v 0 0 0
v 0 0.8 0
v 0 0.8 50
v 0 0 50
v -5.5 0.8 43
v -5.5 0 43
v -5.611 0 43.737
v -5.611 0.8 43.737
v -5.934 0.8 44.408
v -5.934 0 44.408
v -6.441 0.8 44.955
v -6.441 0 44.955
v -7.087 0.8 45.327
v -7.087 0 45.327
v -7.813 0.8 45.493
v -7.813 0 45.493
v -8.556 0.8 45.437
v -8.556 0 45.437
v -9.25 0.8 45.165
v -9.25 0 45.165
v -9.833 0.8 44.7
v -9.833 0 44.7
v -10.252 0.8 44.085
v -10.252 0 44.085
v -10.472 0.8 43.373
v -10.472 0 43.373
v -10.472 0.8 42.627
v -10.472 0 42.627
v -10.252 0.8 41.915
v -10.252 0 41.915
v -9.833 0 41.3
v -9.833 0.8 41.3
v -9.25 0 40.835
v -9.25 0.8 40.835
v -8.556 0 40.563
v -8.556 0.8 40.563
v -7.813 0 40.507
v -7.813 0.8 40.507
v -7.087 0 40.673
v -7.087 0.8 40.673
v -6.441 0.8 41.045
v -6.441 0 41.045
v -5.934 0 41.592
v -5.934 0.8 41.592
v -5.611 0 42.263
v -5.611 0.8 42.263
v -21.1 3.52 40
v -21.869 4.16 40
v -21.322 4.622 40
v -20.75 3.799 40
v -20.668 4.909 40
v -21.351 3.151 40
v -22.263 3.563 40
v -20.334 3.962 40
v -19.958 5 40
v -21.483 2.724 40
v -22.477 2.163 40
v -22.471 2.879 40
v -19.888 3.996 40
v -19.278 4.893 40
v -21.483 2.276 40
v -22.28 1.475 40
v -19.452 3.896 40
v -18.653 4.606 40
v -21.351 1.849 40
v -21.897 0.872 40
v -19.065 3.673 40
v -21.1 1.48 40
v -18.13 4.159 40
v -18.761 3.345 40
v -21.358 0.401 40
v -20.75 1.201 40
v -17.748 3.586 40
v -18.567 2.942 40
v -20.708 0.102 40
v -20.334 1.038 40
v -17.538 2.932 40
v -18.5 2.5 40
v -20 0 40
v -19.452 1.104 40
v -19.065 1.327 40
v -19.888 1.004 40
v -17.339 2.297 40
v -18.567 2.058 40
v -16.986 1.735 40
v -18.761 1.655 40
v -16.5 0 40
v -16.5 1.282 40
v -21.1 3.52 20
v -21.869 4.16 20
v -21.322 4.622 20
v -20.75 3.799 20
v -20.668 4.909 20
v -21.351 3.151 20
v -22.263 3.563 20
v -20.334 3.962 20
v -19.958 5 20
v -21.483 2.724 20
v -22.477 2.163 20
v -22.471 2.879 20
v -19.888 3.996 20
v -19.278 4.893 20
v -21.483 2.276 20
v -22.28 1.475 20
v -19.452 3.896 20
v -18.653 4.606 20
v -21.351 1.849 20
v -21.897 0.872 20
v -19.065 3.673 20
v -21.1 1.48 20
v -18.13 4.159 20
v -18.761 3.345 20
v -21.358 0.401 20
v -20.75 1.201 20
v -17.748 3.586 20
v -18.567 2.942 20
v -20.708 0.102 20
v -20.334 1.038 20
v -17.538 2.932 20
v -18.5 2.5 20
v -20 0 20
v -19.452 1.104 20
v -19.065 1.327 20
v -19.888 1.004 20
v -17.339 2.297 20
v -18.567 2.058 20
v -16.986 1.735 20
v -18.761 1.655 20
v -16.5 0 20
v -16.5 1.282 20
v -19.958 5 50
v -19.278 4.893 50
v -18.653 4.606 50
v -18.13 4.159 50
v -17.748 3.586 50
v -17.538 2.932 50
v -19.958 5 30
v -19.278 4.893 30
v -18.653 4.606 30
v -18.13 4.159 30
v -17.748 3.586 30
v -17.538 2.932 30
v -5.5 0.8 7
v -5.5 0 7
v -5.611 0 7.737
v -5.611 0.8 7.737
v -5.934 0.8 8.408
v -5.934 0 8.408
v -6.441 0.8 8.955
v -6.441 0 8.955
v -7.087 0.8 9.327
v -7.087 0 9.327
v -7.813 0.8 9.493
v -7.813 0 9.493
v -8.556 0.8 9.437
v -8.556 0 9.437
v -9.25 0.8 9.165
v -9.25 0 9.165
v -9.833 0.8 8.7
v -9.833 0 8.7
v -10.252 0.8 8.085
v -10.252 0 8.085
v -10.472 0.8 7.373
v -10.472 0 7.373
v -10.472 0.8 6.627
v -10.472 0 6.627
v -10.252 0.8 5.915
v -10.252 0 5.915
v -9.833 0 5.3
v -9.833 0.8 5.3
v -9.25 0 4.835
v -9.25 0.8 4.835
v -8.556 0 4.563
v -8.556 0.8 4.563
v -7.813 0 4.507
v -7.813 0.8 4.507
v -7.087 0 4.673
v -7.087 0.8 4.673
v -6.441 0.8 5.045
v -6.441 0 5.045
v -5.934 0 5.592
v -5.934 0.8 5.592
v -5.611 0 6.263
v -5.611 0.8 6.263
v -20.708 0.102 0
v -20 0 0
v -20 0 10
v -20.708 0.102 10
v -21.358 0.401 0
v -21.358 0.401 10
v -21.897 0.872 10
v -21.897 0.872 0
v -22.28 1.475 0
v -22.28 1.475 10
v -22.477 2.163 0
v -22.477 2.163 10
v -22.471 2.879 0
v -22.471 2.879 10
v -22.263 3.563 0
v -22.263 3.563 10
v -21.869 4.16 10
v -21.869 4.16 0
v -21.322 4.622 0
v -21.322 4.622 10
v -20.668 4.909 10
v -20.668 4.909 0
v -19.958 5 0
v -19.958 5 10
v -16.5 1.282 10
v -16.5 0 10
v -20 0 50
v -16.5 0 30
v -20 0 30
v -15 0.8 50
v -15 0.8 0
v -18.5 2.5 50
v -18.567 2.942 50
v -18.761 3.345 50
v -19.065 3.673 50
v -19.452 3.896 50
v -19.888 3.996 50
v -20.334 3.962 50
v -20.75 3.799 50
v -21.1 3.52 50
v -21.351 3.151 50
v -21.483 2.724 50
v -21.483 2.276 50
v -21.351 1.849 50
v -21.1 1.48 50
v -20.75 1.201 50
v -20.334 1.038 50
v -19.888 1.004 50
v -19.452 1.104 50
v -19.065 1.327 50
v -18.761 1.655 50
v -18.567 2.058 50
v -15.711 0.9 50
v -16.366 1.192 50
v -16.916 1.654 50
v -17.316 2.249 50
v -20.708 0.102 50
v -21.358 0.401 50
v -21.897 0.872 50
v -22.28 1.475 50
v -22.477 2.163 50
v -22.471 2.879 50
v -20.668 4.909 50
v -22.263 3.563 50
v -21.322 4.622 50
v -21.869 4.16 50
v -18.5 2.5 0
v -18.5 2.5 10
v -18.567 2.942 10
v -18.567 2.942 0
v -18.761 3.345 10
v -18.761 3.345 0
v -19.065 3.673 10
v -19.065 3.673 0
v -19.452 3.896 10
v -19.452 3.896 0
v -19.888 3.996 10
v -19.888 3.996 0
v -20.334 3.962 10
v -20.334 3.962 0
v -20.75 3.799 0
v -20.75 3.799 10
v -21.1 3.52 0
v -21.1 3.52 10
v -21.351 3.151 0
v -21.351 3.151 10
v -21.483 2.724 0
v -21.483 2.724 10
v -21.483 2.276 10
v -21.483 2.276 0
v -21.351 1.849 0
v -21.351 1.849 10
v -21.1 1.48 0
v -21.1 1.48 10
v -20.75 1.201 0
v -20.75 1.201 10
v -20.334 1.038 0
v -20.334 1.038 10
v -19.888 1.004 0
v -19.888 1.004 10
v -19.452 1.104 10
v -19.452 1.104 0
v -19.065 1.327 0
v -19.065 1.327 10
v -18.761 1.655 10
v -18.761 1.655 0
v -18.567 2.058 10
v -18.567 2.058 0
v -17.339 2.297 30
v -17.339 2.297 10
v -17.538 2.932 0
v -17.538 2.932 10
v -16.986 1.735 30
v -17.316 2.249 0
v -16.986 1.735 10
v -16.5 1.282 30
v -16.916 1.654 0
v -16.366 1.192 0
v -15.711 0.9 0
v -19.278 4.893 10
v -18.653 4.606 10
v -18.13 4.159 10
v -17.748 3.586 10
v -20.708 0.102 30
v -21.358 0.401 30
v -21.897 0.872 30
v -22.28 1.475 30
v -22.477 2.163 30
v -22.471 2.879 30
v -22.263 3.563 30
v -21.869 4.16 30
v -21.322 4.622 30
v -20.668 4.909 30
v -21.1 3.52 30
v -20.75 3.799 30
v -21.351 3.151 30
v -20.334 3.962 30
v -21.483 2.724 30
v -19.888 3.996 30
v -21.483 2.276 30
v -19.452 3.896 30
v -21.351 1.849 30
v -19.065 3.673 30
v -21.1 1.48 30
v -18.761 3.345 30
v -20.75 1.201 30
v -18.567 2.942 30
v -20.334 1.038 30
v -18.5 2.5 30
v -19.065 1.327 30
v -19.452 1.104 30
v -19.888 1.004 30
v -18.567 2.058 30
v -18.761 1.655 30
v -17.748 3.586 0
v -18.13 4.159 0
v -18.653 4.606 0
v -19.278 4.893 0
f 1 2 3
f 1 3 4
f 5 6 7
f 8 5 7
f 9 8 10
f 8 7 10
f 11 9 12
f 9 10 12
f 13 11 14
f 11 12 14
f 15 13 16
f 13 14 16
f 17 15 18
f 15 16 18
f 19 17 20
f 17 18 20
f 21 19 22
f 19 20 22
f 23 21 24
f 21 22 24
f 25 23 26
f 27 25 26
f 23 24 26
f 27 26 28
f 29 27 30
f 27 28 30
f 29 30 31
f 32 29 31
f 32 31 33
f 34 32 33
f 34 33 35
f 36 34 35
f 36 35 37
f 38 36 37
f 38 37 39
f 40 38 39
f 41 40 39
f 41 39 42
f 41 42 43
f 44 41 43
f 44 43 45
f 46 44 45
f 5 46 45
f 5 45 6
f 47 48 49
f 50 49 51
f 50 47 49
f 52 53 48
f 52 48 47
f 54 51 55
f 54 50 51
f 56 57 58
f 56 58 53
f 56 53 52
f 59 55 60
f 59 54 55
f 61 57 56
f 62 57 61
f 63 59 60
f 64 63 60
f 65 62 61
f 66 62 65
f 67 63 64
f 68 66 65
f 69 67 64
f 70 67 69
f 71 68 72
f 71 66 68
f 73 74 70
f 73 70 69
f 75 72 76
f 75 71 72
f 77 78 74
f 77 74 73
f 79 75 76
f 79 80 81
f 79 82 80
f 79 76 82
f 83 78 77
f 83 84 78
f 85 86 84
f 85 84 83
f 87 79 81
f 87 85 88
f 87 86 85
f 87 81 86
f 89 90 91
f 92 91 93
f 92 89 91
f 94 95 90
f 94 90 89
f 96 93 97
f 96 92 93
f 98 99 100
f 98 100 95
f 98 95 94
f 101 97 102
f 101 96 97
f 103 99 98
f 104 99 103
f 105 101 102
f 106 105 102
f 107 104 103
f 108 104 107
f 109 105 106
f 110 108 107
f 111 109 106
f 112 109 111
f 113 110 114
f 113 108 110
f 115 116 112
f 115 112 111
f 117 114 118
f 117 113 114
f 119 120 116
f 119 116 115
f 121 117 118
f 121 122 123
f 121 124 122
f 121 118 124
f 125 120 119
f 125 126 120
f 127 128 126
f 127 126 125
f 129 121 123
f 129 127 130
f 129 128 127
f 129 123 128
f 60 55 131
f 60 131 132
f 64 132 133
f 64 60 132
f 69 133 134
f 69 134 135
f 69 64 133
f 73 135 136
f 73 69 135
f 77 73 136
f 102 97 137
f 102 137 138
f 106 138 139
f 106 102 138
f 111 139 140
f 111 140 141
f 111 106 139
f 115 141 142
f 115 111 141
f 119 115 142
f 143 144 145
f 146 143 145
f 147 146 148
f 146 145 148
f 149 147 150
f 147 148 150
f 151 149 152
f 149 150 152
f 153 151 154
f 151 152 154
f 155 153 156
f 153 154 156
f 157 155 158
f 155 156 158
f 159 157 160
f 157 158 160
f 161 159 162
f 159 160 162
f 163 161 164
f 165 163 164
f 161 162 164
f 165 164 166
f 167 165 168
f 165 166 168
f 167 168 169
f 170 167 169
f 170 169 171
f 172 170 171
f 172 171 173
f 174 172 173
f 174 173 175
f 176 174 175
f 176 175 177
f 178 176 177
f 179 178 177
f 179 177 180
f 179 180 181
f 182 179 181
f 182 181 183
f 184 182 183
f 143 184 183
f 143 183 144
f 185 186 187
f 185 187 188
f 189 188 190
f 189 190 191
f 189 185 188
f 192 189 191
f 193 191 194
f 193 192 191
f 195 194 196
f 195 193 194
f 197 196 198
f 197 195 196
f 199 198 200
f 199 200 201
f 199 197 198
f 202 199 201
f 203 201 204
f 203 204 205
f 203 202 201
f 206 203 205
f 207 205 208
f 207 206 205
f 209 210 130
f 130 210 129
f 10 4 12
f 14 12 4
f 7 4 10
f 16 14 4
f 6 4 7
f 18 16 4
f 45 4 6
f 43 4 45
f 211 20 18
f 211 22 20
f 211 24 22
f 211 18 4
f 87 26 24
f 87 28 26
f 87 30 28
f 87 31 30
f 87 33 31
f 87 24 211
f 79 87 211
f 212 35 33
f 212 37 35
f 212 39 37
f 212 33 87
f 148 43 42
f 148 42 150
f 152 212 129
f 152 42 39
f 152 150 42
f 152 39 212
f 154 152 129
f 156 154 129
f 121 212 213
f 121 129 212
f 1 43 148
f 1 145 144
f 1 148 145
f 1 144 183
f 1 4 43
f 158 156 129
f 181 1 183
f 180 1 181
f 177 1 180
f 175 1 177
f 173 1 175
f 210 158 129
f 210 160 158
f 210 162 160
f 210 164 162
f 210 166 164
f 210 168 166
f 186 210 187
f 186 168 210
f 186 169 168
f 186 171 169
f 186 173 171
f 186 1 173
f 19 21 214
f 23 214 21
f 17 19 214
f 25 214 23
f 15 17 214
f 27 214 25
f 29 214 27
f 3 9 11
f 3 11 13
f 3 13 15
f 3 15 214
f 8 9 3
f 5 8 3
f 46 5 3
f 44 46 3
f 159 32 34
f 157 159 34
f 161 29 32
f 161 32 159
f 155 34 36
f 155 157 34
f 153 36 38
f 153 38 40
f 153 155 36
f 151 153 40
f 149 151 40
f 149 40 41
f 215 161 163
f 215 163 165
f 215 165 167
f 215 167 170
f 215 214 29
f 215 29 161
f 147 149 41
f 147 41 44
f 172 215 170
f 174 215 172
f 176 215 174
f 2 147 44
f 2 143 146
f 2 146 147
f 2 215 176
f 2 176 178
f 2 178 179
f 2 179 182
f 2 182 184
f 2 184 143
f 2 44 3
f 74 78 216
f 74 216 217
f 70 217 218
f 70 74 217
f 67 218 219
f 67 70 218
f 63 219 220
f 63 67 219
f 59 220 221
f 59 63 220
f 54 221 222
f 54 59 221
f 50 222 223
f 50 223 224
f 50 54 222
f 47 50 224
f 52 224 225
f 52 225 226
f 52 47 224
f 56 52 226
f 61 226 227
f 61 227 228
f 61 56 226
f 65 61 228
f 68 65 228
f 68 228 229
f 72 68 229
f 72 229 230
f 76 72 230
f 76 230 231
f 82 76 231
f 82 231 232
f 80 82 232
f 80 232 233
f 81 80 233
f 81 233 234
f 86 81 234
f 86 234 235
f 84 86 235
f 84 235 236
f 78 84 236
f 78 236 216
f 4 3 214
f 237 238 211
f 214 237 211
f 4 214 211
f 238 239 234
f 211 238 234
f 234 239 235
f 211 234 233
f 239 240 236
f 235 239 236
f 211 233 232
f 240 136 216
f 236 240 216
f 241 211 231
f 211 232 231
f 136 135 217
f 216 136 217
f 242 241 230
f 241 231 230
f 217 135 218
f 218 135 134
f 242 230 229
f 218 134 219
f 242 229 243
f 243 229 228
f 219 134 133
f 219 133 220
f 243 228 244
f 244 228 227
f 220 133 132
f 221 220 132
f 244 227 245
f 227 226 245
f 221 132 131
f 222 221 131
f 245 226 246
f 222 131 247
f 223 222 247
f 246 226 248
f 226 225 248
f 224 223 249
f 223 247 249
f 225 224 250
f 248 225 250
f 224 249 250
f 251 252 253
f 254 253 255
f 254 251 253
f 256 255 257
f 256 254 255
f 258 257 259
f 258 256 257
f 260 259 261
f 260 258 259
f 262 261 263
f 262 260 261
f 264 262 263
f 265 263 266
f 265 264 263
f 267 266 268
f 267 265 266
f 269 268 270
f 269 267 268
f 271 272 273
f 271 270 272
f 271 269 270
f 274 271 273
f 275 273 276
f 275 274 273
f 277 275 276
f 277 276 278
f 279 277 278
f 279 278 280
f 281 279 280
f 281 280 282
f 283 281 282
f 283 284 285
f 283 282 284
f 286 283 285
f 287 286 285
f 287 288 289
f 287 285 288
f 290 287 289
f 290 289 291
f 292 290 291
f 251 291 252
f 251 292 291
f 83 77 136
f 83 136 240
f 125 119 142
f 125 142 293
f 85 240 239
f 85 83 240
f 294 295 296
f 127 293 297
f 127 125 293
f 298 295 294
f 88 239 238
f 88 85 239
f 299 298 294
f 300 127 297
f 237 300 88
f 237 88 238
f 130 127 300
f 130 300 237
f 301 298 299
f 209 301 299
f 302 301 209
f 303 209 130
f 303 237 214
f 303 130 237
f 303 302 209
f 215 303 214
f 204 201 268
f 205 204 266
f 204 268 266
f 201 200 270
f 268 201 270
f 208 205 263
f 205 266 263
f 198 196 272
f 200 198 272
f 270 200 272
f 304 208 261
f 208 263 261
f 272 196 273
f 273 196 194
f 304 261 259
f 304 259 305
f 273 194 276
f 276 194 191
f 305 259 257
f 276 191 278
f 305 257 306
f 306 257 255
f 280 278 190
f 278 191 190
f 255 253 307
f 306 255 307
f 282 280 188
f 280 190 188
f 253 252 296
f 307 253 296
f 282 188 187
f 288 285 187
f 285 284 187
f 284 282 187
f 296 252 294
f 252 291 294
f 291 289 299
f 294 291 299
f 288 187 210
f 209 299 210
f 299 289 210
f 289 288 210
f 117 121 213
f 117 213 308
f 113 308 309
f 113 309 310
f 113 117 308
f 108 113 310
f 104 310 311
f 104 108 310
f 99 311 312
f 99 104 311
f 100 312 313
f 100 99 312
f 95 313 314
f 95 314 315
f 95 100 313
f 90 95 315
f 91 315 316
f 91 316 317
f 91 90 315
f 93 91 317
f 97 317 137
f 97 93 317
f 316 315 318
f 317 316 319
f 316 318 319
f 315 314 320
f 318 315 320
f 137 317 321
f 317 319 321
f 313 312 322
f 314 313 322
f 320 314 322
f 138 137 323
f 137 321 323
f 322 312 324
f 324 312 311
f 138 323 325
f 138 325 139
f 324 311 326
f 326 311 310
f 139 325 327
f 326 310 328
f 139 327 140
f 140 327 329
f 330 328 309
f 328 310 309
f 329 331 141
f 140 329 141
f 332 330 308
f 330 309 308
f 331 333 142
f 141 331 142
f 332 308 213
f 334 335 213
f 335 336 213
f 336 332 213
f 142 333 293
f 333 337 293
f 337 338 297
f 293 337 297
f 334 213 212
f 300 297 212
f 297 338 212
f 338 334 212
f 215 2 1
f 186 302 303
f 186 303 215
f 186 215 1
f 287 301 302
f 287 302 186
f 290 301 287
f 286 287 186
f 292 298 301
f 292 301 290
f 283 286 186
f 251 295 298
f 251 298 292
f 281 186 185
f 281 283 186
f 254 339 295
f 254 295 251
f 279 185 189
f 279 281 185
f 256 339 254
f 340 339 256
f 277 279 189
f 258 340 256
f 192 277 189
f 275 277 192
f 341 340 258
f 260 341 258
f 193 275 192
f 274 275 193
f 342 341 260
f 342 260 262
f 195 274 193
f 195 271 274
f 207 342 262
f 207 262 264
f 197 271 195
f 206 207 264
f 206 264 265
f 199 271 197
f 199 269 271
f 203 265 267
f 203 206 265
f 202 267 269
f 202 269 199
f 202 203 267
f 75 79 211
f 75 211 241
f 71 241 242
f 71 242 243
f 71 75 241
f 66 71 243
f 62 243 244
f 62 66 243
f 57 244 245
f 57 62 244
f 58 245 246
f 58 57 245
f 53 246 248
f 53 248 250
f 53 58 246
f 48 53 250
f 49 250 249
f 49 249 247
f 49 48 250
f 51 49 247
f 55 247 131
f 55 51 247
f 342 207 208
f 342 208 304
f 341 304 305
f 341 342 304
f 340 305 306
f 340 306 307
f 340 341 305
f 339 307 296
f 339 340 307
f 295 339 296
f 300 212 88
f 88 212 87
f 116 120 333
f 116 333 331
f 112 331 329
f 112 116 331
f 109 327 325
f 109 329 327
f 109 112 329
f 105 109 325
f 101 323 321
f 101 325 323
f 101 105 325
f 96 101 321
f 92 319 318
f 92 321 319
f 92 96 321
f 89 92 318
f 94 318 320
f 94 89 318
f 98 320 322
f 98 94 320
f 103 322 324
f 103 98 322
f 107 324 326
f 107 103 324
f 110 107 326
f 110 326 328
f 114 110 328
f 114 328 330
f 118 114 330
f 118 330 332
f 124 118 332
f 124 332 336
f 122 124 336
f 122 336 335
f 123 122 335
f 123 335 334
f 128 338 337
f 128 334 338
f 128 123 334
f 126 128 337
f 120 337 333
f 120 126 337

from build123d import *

# Parameters (mm, degrees)
ESBO_O1_R                = 1.5
RESSALTO_EXTRUS_O1_DEPTH = 50
ESBO_O2_R                = 2.5
ESBO_O2_W                = 6
ESBO_O2_H                = 10
CORTE_EXTRUS_O1_DEPTH    = 6


with BuildPart() as part:
    # Esboço1 → Ressalto-extrusão1 (new body)
    with BuildSketch(Plane.XY):
        with BuildLine():
            Line((0, 0), (-20, 0))
            ThreePointArc((-20, 0), (-22.499911314, 2.521057642), (-19.95788621, 4.999645261))
            ThreePointArc((-19.95788621, 4.999645261), (-18.375952887, 4.400650146), (-17.537523452, 2.9315197))
            ThreePointArc((-17.537523452, 2.9315197), (-16.656985327, 1.403588896), (-15, 0.8))
            Line((-15, 0.8), (0, 0.8))
            Line((0, 0.8), (0, 0))
        make_face()
        with Locations((-20, 2.5)):
            Circle(ESBO_O1_R, mode=Mode.SUBTRACT)
    extrude(amount=RESSALTO_EXTRUS_O1_DEPTH)

    # Esboço2 → Corte-extrusão1 (cut, through all)
    with BuildSketch(Plane.XZ):
        with Locations((-8, 43)):
            Circle(ESBO_O2_R)
        with Locations((-8, 7)):
            Circle(ESBO_O2_R)
        with Locations((-19.5, 15)):
            Rectangle(ESBO_O2_W, ESBO_O2_H)
        with Locations((-19.5, 35)):
            Rectangle(ESBO_O2_W, ESBO_O2_H)
    extrude(amount=-CORTE_EXTRUS_O1_DEPTH, mode=Mode.SUBTRACT)


solid = part.part
